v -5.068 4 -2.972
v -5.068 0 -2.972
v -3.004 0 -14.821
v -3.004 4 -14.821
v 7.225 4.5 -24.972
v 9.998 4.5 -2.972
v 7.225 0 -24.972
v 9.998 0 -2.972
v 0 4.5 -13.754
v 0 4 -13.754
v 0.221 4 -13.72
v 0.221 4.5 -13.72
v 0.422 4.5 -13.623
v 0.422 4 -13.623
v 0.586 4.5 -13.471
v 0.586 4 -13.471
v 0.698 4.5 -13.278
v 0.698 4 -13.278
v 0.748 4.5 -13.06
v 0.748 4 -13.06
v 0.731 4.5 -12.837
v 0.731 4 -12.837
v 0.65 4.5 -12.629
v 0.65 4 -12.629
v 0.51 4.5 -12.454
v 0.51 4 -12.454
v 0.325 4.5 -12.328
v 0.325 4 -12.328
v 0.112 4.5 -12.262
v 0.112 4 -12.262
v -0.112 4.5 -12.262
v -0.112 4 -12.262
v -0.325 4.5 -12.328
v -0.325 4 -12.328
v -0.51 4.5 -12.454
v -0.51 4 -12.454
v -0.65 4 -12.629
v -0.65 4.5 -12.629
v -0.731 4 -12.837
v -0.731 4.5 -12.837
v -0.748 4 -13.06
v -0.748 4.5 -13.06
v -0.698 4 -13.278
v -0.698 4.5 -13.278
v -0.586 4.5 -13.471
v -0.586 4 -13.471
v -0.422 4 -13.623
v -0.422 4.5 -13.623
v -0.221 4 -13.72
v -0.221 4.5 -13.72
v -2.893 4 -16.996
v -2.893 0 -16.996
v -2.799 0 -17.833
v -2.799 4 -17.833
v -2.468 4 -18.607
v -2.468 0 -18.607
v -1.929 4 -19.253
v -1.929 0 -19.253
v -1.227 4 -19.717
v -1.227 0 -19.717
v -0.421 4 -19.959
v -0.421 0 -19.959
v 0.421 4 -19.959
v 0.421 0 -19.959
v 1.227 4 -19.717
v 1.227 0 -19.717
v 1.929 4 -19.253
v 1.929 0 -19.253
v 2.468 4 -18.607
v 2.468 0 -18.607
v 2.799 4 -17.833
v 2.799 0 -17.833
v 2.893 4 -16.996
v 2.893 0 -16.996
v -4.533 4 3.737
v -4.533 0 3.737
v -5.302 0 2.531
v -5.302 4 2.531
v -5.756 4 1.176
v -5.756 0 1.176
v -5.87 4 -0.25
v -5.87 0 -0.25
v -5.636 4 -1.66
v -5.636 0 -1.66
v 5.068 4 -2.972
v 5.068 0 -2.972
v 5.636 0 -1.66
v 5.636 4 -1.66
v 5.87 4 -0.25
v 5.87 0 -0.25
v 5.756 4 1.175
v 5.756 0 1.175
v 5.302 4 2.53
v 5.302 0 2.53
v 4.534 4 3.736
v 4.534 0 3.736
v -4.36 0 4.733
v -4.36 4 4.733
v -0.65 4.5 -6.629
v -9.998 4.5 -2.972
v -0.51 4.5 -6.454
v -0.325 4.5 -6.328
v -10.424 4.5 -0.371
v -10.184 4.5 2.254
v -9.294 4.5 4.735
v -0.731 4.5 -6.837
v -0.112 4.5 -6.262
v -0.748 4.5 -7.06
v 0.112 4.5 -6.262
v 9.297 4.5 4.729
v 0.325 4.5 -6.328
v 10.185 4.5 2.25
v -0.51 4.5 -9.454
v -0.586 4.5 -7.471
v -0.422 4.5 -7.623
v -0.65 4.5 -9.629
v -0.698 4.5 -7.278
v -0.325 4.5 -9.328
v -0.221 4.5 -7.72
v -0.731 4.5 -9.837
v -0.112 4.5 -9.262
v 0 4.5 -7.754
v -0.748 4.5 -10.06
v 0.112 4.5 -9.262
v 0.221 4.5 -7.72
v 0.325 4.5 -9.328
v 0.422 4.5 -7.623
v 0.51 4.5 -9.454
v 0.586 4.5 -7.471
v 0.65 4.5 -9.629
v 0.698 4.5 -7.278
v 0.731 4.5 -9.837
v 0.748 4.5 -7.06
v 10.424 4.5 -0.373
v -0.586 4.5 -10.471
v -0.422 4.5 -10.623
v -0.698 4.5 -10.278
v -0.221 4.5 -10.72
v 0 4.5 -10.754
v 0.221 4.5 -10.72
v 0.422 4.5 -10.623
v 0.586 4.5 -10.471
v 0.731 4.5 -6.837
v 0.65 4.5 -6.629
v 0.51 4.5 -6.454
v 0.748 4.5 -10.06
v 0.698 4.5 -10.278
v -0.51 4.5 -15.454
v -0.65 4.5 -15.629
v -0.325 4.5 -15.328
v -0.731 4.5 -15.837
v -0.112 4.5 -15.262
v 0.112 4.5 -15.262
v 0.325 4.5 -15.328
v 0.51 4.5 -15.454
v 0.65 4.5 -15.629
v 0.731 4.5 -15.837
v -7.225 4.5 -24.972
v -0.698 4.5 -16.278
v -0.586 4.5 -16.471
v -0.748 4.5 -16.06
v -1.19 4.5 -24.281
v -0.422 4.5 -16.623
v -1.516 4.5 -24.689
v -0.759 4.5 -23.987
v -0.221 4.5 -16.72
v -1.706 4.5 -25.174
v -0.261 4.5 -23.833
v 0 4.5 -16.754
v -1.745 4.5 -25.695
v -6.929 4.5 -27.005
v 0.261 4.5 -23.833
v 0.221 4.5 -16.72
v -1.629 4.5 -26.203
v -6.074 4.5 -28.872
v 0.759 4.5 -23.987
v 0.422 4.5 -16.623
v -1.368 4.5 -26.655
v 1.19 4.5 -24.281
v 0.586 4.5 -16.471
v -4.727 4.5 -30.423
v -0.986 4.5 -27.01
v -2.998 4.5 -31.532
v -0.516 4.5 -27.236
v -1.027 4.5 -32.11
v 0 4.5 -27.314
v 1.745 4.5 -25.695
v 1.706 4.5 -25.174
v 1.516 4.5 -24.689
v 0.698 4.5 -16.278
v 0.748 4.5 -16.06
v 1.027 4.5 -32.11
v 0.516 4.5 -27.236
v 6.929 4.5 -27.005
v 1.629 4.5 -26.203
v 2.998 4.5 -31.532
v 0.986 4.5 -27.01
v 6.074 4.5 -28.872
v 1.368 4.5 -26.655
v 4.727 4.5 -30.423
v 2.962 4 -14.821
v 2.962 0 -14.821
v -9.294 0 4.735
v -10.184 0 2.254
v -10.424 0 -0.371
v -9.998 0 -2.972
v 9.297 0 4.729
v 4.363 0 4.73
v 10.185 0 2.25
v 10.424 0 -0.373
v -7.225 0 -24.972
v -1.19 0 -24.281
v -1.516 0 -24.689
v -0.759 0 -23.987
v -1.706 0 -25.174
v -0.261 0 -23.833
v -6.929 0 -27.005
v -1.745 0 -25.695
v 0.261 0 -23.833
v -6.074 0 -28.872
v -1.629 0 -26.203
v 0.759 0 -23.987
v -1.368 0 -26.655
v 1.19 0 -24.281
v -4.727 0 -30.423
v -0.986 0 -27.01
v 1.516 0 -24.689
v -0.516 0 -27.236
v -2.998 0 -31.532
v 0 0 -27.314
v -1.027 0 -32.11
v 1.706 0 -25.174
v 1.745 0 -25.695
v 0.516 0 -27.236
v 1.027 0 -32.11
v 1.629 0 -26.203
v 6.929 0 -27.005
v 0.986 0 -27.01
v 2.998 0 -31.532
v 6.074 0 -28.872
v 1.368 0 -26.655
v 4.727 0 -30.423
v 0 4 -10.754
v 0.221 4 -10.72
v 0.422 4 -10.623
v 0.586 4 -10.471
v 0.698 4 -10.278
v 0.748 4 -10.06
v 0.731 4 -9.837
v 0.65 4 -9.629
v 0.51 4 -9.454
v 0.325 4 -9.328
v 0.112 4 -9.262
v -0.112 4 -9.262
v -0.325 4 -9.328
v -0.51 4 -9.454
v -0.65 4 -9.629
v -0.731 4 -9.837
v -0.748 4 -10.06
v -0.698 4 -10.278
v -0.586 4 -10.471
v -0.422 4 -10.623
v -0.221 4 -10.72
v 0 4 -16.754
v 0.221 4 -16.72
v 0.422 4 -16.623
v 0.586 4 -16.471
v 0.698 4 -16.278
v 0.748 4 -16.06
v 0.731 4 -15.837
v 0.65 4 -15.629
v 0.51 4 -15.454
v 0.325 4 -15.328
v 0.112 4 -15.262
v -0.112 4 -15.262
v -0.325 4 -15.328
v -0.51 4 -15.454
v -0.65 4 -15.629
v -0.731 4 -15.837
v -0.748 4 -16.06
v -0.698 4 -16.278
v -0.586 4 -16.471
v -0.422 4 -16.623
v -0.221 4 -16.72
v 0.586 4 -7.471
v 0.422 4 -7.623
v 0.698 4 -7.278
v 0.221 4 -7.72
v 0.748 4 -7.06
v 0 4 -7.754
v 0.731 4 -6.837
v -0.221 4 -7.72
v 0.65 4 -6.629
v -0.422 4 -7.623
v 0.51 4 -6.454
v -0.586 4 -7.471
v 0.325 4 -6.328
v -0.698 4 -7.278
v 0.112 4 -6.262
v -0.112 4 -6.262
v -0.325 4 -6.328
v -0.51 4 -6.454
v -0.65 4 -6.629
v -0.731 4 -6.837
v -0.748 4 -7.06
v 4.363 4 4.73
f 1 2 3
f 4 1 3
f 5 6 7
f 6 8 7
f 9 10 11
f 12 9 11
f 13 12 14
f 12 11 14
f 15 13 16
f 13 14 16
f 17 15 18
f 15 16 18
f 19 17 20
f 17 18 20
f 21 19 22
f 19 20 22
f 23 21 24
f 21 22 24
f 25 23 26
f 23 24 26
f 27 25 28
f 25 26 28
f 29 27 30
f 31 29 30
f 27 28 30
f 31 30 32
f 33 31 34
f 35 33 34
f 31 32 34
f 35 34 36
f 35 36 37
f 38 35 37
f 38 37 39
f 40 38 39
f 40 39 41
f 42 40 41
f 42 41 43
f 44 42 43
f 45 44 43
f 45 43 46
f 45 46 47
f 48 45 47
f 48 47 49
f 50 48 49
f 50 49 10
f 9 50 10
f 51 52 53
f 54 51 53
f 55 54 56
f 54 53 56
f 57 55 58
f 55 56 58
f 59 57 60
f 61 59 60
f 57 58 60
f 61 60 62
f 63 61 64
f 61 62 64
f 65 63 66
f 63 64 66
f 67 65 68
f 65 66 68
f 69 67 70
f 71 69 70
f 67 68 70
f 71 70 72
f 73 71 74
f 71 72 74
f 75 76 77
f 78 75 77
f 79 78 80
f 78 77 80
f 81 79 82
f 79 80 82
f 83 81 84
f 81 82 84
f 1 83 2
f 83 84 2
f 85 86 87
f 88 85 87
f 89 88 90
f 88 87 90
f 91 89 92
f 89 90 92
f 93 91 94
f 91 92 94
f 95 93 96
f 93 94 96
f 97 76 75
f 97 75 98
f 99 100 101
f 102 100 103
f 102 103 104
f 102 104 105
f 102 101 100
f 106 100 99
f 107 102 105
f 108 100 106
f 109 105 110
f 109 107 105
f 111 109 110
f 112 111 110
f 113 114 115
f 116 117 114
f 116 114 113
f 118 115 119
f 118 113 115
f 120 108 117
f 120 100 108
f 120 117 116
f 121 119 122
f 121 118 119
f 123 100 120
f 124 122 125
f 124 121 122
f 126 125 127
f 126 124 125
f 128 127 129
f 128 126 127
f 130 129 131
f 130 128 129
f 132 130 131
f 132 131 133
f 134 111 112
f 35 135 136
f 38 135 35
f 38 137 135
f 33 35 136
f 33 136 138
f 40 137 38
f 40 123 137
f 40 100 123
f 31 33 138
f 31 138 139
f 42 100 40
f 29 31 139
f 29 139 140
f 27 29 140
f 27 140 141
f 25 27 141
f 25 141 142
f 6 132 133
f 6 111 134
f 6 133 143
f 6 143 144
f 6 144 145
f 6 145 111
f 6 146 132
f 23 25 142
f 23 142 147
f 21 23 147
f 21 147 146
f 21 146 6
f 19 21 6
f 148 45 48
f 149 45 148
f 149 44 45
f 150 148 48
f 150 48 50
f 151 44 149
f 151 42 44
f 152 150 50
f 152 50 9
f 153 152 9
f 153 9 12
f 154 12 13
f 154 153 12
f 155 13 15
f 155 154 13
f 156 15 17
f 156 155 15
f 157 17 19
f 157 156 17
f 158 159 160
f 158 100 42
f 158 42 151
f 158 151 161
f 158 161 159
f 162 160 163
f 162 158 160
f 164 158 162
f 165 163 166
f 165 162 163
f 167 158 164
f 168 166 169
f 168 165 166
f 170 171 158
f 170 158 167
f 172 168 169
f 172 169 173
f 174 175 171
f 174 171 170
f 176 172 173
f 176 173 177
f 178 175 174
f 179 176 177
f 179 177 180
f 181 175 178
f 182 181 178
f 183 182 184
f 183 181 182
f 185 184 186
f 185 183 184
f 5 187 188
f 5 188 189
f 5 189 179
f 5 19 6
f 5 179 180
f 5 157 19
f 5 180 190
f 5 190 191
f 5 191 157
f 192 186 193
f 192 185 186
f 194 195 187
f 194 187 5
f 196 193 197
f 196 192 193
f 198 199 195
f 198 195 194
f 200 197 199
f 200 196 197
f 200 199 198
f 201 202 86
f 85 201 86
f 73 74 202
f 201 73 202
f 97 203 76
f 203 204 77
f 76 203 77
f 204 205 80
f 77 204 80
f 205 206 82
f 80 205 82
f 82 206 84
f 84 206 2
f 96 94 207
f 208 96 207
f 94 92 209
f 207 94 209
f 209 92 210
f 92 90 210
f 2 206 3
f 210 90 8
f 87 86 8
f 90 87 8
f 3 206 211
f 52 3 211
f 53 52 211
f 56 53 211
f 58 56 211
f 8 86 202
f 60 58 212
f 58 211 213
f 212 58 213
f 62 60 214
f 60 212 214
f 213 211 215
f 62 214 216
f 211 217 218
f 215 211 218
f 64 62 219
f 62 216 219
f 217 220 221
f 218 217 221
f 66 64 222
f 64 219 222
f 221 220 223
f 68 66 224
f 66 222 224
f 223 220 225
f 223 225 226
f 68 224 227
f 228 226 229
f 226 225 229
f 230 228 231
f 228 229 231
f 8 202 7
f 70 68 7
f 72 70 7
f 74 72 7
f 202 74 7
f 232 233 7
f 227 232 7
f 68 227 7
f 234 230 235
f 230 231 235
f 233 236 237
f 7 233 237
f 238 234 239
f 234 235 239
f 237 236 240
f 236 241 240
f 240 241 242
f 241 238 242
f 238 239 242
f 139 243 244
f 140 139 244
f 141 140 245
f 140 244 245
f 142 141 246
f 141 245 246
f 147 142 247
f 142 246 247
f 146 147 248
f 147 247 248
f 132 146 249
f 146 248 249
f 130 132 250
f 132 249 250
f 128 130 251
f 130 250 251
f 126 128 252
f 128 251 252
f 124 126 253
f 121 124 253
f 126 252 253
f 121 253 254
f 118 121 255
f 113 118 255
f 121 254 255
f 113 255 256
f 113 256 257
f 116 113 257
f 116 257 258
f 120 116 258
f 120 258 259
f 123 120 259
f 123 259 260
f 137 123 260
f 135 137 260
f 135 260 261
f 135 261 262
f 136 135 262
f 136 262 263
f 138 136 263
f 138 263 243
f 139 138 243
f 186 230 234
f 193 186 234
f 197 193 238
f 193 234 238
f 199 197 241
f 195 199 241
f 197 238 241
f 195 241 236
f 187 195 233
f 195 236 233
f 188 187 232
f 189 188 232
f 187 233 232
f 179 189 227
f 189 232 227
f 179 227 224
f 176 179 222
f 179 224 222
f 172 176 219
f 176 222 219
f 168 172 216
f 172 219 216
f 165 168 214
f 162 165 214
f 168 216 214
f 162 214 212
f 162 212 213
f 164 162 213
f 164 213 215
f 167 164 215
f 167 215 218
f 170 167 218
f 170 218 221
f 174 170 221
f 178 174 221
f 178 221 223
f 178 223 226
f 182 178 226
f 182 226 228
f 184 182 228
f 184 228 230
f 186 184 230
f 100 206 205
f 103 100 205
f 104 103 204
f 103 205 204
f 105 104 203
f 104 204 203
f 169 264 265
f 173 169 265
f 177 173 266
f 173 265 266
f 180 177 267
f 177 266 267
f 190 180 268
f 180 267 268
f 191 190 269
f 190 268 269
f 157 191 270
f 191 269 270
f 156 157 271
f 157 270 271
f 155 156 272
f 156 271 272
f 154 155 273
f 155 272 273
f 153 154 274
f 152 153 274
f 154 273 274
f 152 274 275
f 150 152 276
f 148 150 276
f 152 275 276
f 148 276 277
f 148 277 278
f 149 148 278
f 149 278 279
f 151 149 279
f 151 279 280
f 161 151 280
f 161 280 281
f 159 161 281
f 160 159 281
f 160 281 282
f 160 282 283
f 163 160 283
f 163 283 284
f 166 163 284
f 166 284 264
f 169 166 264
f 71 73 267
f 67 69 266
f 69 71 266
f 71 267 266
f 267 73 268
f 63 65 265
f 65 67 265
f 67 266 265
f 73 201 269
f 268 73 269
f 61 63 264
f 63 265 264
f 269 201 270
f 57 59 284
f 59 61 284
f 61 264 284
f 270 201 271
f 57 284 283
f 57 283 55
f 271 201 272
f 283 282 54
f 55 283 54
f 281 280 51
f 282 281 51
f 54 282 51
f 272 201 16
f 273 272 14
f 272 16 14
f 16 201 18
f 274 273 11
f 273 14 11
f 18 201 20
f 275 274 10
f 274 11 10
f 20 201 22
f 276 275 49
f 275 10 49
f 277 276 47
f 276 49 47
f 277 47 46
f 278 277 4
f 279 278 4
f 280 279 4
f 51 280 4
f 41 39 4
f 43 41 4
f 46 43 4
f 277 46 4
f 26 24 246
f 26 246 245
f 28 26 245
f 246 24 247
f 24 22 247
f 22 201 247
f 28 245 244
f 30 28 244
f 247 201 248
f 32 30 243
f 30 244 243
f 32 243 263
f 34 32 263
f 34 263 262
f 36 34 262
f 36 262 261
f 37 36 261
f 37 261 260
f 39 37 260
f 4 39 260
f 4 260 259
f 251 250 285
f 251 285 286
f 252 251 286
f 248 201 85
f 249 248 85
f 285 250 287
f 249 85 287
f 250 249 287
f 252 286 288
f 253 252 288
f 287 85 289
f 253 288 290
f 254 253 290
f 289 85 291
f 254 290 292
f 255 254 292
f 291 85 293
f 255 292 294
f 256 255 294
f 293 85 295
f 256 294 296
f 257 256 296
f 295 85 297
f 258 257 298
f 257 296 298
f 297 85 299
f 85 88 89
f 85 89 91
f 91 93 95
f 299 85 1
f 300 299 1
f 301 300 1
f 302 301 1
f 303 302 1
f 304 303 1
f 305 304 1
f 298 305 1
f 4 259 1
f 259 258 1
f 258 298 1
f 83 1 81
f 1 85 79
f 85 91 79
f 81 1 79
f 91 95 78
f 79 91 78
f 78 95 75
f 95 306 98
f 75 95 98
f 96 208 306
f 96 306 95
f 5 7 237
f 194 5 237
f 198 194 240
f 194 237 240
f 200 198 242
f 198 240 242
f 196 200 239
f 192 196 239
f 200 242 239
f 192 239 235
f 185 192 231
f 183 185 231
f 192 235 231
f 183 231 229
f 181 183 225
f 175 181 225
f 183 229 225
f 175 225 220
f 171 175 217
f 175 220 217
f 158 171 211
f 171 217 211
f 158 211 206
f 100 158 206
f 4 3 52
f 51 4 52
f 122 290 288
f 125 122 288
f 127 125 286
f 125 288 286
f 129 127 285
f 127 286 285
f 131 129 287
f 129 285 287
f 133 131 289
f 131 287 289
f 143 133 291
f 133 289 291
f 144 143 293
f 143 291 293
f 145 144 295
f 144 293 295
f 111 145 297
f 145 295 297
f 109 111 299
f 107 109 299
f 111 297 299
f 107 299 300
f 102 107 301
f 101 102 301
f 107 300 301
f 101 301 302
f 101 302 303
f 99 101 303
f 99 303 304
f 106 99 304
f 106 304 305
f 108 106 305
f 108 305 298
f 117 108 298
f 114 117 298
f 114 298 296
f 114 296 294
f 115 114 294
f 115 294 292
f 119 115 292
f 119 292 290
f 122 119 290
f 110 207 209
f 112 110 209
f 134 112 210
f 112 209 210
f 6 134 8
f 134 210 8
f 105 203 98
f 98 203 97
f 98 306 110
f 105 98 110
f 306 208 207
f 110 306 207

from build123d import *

# Parameters (mm, degrees)
DODANIE_WYCI_GNI_CIE1_DEPTH = 4
DODANIE_WYCI_GNI_CIE2_DEPTH = 0.5
WYTNIJ_WYCI_GNI_CIE6_DEPTH  = 4
WYTNIJ_WYCI_GNI_CIE7_DEPTH  = 10
SZKIC8_R                    = 1.75
WYTNIJ_WYCI_GNI_CIE8_DEPTH  = 10
SZKIC9_R                    = 0.75
WYTNIJ_WYCI_GNI_CIE9_DEPTH  = 10


with BuildPart() as part:
    # Szkic1 → Dodanie-wyciągnięcie1 (new body)
    with BuildSketch(Plane(origin=(0, 0, 0), x_dir=(1, 0, 0), z_dir=(0, 1, 0))):
        with BuildLine():
            Line((-7.225110555, 24.972122297), (-9.998428156, 2.972122297))
            ThreePointArc((-9.998428156, 2.972122297), (0, -10.430823387), (9.998428156, 2.972122297))
            Line((9.998428156, 2.972122297), (7.225110555, 24.972122297))
            ThreePointArc((7.225110555, 24.972122297), (0, 32.183793132), (-7.225110555, 24.972122297))
        make_face()
        with BuildLine():
            Line((-5.067752367, 2.972122297), (-3.003681195, 14.820995555))
            Line((-3.003681195, 14.820995555), (-2.892810316, 16.996498506))
            ThreePointArc((-2.892810316, 16.996498506), (0, 19.989966002), (2.892810316, 16.996498506))
            Line((2.892810316, 16.996498506), (2.962451003, 14.820995555))
            Line((2.962451003, 14.820995555), (5.067752367, 2.972122297))
            ThreePointArc((5.067752367, 2.972122297), (0, -5.875), (-5.067752367, 2.972122297))
        make_face(mode=Mode.SUBTRACT)
    extrude(amount=DODANIE_WYCI_GNI_CIE1_DEPTH)

    # Szkic2 → Dodanie-wyciągnięcie2 (add)
    with BuildSketch(Plane(origin=(0, 4, 0), x_dir=(1, 0, 0), z_dir=(0, 1, 0))):
        with BuildLine():
            Line((-7.225110555, 24.972122297), (-9.998428156, 2.972122297))
            ThreePointArc((-9.998428156, 2.972122297), (0, -10.430823387), (9.998428156, 2.972122297))
            Line((9.998428156, 2.972122297), (7.225110555, 24.972122297))
            ThreePointArc((7.225110555, 24.972122297), (0, 32.183793132), (-7.225110555, 24.972122297))
        make_face()
    extrude(amount=DODANIE_WYCI_GNI_CIE2_DEPTH)

    # Szkic5 → Wytnij-wyciągnięcie6 (cut)
    with BuildSketch(Plane.XZ):
        with BuildLine():
            Line((-2.212371502, 17.095463356), (2.237628498, 17.095463356))
            Line((2.237628498, 17.095463356), (4.534426812, 3.735585428))
            ThreePointArc((4.534426812, 3.735585428), (0.000881881, 5.874999934), (-4.53330513, 3.736946561))
            Line((-4.53330513, 3.736946561), (-2.212371502, 17.095463356))
        make_face()
    extrude(amount=-WYTNIJ_WYCI_GNI_CIE6_DEPTH, mode=Mode.SUBTRACT)

    # Szkic7 → Wytnij-wyciągnięcie7 (cut)
    with BuildSketch(Plane.XZ):
        with BuildLine():
            Line((-9.294248657, 4.73487259), (9.297326284, 4.728826547))
            ThreePointArc((9.297326284, 4.728826547), (0.003392139, 10.430822836), (-9.294248657, 4.73487259))
        make_face()
    extrude(amount=-WYTNIJ_WYCI_GNI_CIE7_DEPTH, mode=Mode.SUBTRACT)

    # Szkic8 → Wytnij-wyciągnięcie8 (cut)
    with BuildSketch(Plane.XZ):
        with Locations(Location((0, -25.563793132, 0), (0, 0, 270))):
            Circle(SZKIC8_R)
    extrude(amount=-WYTNIJ_WYCI_GNI_CIE8_DEPTH, mode=Mode.SUBTRACT)

    # Szkic9 → Wytnij-wyciągnięcie9 (cut)
    with BuildSketch(Plane.XZ.offset(-4)):
        with Locations(Location((0, -16.003793132, 0), (0, 0, 270))):
            Circle(SZKIC9_R)
        with Locations(Location((0, -13.003793132, 0), (0, 0, 270))):
            Circle(SZKIC9_R)
        with Locations(Location((0, -10.003793132, 0), (0, 0, 270))):
            Circle(SZKIC9_R)
        with Locations(Location((0, -7.003793132, 0), (0, 0, 270))):
            Circle(SZKIC9_R)
    extrude(amount=-WYTNIJ_WYCI_GNI_CIE9_DEPTH, mode=Mode.SUBTRACT)


solid = part.part
